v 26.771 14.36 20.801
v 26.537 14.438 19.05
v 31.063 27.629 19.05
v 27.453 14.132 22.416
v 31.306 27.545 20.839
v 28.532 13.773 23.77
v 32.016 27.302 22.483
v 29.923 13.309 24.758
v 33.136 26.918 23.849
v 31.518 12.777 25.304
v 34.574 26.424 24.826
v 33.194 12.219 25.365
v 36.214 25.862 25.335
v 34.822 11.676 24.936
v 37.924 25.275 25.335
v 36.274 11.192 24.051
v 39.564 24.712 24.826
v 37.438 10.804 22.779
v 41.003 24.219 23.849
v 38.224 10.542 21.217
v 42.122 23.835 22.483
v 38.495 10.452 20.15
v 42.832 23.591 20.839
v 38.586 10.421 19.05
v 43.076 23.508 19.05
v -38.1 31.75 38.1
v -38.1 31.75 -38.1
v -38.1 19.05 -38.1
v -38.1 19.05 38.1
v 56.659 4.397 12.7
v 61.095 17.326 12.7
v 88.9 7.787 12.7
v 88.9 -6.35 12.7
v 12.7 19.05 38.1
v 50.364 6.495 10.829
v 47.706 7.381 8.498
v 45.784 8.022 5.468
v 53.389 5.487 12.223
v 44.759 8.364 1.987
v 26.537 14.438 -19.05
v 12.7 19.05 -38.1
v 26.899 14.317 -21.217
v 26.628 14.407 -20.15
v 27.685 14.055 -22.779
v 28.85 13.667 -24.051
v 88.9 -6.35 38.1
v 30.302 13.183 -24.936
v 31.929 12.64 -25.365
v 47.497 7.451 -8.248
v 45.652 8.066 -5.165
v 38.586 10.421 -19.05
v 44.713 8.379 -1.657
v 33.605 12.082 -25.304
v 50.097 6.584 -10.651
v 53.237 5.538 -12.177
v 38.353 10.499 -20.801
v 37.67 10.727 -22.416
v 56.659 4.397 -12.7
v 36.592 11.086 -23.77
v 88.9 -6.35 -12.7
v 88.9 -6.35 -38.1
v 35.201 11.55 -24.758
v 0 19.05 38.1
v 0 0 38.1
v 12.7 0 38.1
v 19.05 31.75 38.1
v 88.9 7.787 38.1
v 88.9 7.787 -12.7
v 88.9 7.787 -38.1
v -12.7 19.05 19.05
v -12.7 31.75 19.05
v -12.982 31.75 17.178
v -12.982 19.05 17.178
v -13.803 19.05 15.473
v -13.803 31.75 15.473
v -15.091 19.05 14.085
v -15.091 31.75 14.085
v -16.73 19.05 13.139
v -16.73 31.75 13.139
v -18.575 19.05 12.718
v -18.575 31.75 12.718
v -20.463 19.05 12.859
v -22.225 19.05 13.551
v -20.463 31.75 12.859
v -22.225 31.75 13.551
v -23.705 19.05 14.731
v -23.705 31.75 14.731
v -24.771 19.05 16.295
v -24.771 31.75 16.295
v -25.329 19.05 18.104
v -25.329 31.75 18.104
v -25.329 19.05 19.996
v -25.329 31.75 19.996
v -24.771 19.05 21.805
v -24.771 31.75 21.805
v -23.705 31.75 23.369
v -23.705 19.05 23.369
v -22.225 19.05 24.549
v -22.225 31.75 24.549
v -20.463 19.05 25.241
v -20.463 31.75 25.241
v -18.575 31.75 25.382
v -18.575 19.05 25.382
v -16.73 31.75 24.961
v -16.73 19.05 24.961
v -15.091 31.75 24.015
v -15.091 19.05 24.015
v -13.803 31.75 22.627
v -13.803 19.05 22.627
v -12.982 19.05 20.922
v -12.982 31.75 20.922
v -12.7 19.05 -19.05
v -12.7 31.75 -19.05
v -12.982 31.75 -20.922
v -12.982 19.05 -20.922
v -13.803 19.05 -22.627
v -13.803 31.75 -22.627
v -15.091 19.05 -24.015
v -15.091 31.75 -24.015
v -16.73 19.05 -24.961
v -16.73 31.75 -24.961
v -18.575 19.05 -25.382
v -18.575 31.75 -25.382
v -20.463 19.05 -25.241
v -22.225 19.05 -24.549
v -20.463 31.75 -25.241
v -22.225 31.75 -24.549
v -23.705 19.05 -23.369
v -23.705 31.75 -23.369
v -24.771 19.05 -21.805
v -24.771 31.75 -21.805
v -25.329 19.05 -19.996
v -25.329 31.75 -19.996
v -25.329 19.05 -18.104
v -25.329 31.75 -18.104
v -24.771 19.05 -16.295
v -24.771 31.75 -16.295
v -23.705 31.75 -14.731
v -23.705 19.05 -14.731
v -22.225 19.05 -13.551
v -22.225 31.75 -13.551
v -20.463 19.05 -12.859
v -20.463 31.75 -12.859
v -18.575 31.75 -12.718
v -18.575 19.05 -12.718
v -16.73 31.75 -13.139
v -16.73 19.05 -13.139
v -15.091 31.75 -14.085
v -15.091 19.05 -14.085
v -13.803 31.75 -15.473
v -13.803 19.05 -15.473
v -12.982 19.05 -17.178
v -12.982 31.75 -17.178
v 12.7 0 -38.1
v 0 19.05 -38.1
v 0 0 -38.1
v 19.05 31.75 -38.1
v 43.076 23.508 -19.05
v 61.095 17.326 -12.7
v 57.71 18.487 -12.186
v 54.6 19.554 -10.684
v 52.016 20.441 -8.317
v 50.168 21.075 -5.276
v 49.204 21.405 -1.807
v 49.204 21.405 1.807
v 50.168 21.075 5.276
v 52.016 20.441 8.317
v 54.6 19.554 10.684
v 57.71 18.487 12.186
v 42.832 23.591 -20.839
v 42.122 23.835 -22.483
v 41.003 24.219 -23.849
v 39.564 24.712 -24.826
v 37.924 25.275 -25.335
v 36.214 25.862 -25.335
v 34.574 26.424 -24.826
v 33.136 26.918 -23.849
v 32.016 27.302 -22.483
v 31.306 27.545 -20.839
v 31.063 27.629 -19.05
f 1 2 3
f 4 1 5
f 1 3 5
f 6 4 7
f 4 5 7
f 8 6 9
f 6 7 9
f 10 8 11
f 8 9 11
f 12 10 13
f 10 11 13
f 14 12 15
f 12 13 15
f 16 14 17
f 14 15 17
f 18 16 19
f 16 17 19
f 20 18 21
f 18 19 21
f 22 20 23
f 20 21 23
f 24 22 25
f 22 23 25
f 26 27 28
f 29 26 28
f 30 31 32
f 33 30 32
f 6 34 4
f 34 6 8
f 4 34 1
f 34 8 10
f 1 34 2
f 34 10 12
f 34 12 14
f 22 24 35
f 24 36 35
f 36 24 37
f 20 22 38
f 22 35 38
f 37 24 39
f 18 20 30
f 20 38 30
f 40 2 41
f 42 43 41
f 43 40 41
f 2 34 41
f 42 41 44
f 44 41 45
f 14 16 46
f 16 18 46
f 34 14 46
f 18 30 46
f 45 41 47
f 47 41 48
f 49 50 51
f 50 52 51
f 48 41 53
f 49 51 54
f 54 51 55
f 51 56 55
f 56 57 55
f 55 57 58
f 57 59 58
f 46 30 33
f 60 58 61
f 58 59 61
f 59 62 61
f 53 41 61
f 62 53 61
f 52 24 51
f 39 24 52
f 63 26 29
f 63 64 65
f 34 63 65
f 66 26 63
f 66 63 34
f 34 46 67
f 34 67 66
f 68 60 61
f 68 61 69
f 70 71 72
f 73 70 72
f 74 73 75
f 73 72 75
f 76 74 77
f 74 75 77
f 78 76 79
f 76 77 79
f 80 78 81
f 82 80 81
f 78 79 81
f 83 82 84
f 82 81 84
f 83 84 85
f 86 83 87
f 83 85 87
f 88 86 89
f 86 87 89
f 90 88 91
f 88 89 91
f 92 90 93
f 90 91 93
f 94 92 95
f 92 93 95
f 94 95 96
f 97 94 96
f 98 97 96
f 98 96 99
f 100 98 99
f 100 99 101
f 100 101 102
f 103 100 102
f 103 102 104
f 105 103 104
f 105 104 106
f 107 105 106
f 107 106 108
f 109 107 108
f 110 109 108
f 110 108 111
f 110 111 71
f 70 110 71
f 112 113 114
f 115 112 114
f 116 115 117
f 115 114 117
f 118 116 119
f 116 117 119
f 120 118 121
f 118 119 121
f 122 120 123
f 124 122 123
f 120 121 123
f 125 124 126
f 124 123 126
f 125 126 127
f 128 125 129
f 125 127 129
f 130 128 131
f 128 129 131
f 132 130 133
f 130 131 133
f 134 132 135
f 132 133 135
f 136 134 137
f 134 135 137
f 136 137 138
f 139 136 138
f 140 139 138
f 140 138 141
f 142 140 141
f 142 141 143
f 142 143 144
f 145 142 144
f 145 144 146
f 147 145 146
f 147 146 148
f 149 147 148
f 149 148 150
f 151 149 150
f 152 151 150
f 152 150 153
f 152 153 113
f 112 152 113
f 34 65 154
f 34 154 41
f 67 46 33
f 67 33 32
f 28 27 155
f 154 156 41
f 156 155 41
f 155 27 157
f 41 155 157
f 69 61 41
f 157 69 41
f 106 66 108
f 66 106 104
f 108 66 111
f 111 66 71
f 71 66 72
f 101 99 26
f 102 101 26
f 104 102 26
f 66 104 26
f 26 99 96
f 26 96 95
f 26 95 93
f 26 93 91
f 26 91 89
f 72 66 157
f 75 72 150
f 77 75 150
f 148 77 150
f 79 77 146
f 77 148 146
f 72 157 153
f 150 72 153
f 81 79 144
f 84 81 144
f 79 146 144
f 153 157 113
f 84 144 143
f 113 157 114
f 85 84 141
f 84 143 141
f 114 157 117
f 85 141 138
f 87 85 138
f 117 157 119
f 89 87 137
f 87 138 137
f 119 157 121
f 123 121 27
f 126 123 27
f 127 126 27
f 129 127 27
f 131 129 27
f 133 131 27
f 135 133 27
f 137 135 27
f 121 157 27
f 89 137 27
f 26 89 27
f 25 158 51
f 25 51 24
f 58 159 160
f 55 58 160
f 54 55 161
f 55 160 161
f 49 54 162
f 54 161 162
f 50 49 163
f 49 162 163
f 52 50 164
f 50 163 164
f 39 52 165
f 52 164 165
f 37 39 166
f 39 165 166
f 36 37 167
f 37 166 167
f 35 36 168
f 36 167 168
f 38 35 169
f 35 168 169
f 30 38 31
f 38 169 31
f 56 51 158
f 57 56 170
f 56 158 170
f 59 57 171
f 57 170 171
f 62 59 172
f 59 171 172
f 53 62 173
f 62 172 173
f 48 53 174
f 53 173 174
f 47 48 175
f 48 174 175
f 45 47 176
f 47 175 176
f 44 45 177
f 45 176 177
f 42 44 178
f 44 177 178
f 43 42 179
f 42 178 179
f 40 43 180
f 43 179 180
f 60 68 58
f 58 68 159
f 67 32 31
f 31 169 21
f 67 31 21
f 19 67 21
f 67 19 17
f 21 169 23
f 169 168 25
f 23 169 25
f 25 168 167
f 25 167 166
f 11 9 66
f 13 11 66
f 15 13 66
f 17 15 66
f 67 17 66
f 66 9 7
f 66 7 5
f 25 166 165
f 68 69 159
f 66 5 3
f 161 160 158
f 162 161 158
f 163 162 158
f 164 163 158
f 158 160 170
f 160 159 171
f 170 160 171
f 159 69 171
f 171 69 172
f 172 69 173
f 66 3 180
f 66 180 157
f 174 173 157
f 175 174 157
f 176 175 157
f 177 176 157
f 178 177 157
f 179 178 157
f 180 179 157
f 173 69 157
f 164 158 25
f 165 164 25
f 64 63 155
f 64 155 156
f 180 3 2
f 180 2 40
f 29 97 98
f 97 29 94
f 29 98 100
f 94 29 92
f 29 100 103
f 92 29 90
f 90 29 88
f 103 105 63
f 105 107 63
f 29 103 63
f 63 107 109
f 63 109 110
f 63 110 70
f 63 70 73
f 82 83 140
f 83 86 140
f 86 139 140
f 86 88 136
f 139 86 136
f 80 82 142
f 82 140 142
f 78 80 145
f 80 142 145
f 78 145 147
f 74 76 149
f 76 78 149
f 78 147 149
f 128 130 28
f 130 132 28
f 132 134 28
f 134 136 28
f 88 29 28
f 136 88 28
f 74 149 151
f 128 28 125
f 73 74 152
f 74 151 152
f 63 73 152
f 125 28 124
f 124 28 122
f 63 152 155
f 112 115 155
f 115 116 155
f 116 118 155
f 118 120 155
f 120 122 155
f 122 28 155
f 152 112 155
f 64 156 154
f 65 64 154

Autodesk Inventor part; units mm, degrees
ref_plane "YZ Plane" through (0, 0, 0) normal (1, 0, 0) x (0, 1, 0)
ref_plane "XZ Plane" through (0, 0, 0) normal (0, 1, 0) x (-1, 0, 0)
ref_plane "XY Plane" through (0, 0, 0) normal (0, 0, 1) x (1, 0, 0)
sketch "Sketch1" plane through (0, 0, 0) normal (0, 0, 1) x (1, 0, 0)
  line L0 (0, 0) -> (12.7, 0)
  line L1 (12.7, 0) -> (12.7, 19.05)
  line L2 (12.7, 19.05) -> (88.9, -6.35)
  line L3 (88.9, -6.35) -> (88.9, 7.7874)
  line L4 (88.9, 7.7874) -> (19.05, 31.75)
  line L5 (19.05, 31.75) -> (-38.1, 31.75)
  line L6 (-38.1, 31.75) -> (-38.1, 19.05)
  line L7 (-38.1, 19.05) -> (0, 19.05)
  line L8 (0, 19.05) -> (0, 0)
  dimension "d9" = 38.1
  dimension "d10" = 12.7
  dimension "d11" = 19.05
  dimension "d12" = 38.1
  dimension "d13" = 12.7
  dimension "d14" = 127
  dimension "d15" = 57.15
  dimension "d16" = 0.5
extrude "Extrusion1" add sketch "Sketch1" along normal mid plane 76.2
sketch "Sketch2" plane through (-38.1, 31.75, 38.1) normal (0, 1, 0) x (1, 0, 0)
  circle A0 centre (19.05, 19.05) radius 6.35
  circle A1 centre (19.05, 57.15) radius 6.35
  line L0 (57.15, 0) -> (0, 0) projected
  line L1 (0, 76.2) -> (0, 0) projected
  point P0 (38.1, 38.1)
  dimension "d19" = 12.7
  dimension "d20" = 12.7
  dimension "d21" = 0
  dimension "d22" = 38.1
  dimension "d23" = 19.05
  dimension "d24" = 19.05
extrude "Extrusion2" cut sketch "Sketch2" against normal through all
sketch "Sketch3" plane through (19.05, 31.75, 38.1) normal (0.3244944, 0.9458876, 0) x (0.9458876, -0.3244944, 0)
  line L0 (19.05, 19.05) -> (19.05, 57.15) construction
  line L1 (12.7, 19.05) -> (12.7, 57.15)
  line L2 (25.4, 57.15) -> (25.4, 19.05)
  arc A0 (12.7, 19.05) -> (25.4, 19.05) centre (19.05, 19.05) ccw
  arc A1 (25.4, 57.15) -> (12.7, 57.15) centre (19.05, 57.15) ccw
  line L3 (-1.8853, 0) -> (78.4335, 0) projected
  line L4 (0, 76.2) -> (0, 0) projected
  line L5 (44.45, 25.4) -> (78.4335, 25.4)
  line L6 (78.4335, 76.2) -> (78.4335, 0) projected
  line L7 (78.4335, 50.8) -> (44.45, 50.8)
  arc A2 (44.45, 50.8) -> (44.45, 25.4) centre (44.45, 38.1) ccw
  point P0 (-7.7165, 38.1)
  point P1 (19.05, 38.1)
  dimension "d27" = 12.7
  dimension "d28" = 38.1
  dimension "d29" = 19.05
  dimension "d30" = 19.05
  dimension "d31" = 25.4
  dimension "d32" = 38.1
  dimension "d33" = 44.45
extrude "Extrusion3" cut sketch "Sketch3" against normal through all
properties part number "HW 7 Part 6" material "Steel, Mild"
